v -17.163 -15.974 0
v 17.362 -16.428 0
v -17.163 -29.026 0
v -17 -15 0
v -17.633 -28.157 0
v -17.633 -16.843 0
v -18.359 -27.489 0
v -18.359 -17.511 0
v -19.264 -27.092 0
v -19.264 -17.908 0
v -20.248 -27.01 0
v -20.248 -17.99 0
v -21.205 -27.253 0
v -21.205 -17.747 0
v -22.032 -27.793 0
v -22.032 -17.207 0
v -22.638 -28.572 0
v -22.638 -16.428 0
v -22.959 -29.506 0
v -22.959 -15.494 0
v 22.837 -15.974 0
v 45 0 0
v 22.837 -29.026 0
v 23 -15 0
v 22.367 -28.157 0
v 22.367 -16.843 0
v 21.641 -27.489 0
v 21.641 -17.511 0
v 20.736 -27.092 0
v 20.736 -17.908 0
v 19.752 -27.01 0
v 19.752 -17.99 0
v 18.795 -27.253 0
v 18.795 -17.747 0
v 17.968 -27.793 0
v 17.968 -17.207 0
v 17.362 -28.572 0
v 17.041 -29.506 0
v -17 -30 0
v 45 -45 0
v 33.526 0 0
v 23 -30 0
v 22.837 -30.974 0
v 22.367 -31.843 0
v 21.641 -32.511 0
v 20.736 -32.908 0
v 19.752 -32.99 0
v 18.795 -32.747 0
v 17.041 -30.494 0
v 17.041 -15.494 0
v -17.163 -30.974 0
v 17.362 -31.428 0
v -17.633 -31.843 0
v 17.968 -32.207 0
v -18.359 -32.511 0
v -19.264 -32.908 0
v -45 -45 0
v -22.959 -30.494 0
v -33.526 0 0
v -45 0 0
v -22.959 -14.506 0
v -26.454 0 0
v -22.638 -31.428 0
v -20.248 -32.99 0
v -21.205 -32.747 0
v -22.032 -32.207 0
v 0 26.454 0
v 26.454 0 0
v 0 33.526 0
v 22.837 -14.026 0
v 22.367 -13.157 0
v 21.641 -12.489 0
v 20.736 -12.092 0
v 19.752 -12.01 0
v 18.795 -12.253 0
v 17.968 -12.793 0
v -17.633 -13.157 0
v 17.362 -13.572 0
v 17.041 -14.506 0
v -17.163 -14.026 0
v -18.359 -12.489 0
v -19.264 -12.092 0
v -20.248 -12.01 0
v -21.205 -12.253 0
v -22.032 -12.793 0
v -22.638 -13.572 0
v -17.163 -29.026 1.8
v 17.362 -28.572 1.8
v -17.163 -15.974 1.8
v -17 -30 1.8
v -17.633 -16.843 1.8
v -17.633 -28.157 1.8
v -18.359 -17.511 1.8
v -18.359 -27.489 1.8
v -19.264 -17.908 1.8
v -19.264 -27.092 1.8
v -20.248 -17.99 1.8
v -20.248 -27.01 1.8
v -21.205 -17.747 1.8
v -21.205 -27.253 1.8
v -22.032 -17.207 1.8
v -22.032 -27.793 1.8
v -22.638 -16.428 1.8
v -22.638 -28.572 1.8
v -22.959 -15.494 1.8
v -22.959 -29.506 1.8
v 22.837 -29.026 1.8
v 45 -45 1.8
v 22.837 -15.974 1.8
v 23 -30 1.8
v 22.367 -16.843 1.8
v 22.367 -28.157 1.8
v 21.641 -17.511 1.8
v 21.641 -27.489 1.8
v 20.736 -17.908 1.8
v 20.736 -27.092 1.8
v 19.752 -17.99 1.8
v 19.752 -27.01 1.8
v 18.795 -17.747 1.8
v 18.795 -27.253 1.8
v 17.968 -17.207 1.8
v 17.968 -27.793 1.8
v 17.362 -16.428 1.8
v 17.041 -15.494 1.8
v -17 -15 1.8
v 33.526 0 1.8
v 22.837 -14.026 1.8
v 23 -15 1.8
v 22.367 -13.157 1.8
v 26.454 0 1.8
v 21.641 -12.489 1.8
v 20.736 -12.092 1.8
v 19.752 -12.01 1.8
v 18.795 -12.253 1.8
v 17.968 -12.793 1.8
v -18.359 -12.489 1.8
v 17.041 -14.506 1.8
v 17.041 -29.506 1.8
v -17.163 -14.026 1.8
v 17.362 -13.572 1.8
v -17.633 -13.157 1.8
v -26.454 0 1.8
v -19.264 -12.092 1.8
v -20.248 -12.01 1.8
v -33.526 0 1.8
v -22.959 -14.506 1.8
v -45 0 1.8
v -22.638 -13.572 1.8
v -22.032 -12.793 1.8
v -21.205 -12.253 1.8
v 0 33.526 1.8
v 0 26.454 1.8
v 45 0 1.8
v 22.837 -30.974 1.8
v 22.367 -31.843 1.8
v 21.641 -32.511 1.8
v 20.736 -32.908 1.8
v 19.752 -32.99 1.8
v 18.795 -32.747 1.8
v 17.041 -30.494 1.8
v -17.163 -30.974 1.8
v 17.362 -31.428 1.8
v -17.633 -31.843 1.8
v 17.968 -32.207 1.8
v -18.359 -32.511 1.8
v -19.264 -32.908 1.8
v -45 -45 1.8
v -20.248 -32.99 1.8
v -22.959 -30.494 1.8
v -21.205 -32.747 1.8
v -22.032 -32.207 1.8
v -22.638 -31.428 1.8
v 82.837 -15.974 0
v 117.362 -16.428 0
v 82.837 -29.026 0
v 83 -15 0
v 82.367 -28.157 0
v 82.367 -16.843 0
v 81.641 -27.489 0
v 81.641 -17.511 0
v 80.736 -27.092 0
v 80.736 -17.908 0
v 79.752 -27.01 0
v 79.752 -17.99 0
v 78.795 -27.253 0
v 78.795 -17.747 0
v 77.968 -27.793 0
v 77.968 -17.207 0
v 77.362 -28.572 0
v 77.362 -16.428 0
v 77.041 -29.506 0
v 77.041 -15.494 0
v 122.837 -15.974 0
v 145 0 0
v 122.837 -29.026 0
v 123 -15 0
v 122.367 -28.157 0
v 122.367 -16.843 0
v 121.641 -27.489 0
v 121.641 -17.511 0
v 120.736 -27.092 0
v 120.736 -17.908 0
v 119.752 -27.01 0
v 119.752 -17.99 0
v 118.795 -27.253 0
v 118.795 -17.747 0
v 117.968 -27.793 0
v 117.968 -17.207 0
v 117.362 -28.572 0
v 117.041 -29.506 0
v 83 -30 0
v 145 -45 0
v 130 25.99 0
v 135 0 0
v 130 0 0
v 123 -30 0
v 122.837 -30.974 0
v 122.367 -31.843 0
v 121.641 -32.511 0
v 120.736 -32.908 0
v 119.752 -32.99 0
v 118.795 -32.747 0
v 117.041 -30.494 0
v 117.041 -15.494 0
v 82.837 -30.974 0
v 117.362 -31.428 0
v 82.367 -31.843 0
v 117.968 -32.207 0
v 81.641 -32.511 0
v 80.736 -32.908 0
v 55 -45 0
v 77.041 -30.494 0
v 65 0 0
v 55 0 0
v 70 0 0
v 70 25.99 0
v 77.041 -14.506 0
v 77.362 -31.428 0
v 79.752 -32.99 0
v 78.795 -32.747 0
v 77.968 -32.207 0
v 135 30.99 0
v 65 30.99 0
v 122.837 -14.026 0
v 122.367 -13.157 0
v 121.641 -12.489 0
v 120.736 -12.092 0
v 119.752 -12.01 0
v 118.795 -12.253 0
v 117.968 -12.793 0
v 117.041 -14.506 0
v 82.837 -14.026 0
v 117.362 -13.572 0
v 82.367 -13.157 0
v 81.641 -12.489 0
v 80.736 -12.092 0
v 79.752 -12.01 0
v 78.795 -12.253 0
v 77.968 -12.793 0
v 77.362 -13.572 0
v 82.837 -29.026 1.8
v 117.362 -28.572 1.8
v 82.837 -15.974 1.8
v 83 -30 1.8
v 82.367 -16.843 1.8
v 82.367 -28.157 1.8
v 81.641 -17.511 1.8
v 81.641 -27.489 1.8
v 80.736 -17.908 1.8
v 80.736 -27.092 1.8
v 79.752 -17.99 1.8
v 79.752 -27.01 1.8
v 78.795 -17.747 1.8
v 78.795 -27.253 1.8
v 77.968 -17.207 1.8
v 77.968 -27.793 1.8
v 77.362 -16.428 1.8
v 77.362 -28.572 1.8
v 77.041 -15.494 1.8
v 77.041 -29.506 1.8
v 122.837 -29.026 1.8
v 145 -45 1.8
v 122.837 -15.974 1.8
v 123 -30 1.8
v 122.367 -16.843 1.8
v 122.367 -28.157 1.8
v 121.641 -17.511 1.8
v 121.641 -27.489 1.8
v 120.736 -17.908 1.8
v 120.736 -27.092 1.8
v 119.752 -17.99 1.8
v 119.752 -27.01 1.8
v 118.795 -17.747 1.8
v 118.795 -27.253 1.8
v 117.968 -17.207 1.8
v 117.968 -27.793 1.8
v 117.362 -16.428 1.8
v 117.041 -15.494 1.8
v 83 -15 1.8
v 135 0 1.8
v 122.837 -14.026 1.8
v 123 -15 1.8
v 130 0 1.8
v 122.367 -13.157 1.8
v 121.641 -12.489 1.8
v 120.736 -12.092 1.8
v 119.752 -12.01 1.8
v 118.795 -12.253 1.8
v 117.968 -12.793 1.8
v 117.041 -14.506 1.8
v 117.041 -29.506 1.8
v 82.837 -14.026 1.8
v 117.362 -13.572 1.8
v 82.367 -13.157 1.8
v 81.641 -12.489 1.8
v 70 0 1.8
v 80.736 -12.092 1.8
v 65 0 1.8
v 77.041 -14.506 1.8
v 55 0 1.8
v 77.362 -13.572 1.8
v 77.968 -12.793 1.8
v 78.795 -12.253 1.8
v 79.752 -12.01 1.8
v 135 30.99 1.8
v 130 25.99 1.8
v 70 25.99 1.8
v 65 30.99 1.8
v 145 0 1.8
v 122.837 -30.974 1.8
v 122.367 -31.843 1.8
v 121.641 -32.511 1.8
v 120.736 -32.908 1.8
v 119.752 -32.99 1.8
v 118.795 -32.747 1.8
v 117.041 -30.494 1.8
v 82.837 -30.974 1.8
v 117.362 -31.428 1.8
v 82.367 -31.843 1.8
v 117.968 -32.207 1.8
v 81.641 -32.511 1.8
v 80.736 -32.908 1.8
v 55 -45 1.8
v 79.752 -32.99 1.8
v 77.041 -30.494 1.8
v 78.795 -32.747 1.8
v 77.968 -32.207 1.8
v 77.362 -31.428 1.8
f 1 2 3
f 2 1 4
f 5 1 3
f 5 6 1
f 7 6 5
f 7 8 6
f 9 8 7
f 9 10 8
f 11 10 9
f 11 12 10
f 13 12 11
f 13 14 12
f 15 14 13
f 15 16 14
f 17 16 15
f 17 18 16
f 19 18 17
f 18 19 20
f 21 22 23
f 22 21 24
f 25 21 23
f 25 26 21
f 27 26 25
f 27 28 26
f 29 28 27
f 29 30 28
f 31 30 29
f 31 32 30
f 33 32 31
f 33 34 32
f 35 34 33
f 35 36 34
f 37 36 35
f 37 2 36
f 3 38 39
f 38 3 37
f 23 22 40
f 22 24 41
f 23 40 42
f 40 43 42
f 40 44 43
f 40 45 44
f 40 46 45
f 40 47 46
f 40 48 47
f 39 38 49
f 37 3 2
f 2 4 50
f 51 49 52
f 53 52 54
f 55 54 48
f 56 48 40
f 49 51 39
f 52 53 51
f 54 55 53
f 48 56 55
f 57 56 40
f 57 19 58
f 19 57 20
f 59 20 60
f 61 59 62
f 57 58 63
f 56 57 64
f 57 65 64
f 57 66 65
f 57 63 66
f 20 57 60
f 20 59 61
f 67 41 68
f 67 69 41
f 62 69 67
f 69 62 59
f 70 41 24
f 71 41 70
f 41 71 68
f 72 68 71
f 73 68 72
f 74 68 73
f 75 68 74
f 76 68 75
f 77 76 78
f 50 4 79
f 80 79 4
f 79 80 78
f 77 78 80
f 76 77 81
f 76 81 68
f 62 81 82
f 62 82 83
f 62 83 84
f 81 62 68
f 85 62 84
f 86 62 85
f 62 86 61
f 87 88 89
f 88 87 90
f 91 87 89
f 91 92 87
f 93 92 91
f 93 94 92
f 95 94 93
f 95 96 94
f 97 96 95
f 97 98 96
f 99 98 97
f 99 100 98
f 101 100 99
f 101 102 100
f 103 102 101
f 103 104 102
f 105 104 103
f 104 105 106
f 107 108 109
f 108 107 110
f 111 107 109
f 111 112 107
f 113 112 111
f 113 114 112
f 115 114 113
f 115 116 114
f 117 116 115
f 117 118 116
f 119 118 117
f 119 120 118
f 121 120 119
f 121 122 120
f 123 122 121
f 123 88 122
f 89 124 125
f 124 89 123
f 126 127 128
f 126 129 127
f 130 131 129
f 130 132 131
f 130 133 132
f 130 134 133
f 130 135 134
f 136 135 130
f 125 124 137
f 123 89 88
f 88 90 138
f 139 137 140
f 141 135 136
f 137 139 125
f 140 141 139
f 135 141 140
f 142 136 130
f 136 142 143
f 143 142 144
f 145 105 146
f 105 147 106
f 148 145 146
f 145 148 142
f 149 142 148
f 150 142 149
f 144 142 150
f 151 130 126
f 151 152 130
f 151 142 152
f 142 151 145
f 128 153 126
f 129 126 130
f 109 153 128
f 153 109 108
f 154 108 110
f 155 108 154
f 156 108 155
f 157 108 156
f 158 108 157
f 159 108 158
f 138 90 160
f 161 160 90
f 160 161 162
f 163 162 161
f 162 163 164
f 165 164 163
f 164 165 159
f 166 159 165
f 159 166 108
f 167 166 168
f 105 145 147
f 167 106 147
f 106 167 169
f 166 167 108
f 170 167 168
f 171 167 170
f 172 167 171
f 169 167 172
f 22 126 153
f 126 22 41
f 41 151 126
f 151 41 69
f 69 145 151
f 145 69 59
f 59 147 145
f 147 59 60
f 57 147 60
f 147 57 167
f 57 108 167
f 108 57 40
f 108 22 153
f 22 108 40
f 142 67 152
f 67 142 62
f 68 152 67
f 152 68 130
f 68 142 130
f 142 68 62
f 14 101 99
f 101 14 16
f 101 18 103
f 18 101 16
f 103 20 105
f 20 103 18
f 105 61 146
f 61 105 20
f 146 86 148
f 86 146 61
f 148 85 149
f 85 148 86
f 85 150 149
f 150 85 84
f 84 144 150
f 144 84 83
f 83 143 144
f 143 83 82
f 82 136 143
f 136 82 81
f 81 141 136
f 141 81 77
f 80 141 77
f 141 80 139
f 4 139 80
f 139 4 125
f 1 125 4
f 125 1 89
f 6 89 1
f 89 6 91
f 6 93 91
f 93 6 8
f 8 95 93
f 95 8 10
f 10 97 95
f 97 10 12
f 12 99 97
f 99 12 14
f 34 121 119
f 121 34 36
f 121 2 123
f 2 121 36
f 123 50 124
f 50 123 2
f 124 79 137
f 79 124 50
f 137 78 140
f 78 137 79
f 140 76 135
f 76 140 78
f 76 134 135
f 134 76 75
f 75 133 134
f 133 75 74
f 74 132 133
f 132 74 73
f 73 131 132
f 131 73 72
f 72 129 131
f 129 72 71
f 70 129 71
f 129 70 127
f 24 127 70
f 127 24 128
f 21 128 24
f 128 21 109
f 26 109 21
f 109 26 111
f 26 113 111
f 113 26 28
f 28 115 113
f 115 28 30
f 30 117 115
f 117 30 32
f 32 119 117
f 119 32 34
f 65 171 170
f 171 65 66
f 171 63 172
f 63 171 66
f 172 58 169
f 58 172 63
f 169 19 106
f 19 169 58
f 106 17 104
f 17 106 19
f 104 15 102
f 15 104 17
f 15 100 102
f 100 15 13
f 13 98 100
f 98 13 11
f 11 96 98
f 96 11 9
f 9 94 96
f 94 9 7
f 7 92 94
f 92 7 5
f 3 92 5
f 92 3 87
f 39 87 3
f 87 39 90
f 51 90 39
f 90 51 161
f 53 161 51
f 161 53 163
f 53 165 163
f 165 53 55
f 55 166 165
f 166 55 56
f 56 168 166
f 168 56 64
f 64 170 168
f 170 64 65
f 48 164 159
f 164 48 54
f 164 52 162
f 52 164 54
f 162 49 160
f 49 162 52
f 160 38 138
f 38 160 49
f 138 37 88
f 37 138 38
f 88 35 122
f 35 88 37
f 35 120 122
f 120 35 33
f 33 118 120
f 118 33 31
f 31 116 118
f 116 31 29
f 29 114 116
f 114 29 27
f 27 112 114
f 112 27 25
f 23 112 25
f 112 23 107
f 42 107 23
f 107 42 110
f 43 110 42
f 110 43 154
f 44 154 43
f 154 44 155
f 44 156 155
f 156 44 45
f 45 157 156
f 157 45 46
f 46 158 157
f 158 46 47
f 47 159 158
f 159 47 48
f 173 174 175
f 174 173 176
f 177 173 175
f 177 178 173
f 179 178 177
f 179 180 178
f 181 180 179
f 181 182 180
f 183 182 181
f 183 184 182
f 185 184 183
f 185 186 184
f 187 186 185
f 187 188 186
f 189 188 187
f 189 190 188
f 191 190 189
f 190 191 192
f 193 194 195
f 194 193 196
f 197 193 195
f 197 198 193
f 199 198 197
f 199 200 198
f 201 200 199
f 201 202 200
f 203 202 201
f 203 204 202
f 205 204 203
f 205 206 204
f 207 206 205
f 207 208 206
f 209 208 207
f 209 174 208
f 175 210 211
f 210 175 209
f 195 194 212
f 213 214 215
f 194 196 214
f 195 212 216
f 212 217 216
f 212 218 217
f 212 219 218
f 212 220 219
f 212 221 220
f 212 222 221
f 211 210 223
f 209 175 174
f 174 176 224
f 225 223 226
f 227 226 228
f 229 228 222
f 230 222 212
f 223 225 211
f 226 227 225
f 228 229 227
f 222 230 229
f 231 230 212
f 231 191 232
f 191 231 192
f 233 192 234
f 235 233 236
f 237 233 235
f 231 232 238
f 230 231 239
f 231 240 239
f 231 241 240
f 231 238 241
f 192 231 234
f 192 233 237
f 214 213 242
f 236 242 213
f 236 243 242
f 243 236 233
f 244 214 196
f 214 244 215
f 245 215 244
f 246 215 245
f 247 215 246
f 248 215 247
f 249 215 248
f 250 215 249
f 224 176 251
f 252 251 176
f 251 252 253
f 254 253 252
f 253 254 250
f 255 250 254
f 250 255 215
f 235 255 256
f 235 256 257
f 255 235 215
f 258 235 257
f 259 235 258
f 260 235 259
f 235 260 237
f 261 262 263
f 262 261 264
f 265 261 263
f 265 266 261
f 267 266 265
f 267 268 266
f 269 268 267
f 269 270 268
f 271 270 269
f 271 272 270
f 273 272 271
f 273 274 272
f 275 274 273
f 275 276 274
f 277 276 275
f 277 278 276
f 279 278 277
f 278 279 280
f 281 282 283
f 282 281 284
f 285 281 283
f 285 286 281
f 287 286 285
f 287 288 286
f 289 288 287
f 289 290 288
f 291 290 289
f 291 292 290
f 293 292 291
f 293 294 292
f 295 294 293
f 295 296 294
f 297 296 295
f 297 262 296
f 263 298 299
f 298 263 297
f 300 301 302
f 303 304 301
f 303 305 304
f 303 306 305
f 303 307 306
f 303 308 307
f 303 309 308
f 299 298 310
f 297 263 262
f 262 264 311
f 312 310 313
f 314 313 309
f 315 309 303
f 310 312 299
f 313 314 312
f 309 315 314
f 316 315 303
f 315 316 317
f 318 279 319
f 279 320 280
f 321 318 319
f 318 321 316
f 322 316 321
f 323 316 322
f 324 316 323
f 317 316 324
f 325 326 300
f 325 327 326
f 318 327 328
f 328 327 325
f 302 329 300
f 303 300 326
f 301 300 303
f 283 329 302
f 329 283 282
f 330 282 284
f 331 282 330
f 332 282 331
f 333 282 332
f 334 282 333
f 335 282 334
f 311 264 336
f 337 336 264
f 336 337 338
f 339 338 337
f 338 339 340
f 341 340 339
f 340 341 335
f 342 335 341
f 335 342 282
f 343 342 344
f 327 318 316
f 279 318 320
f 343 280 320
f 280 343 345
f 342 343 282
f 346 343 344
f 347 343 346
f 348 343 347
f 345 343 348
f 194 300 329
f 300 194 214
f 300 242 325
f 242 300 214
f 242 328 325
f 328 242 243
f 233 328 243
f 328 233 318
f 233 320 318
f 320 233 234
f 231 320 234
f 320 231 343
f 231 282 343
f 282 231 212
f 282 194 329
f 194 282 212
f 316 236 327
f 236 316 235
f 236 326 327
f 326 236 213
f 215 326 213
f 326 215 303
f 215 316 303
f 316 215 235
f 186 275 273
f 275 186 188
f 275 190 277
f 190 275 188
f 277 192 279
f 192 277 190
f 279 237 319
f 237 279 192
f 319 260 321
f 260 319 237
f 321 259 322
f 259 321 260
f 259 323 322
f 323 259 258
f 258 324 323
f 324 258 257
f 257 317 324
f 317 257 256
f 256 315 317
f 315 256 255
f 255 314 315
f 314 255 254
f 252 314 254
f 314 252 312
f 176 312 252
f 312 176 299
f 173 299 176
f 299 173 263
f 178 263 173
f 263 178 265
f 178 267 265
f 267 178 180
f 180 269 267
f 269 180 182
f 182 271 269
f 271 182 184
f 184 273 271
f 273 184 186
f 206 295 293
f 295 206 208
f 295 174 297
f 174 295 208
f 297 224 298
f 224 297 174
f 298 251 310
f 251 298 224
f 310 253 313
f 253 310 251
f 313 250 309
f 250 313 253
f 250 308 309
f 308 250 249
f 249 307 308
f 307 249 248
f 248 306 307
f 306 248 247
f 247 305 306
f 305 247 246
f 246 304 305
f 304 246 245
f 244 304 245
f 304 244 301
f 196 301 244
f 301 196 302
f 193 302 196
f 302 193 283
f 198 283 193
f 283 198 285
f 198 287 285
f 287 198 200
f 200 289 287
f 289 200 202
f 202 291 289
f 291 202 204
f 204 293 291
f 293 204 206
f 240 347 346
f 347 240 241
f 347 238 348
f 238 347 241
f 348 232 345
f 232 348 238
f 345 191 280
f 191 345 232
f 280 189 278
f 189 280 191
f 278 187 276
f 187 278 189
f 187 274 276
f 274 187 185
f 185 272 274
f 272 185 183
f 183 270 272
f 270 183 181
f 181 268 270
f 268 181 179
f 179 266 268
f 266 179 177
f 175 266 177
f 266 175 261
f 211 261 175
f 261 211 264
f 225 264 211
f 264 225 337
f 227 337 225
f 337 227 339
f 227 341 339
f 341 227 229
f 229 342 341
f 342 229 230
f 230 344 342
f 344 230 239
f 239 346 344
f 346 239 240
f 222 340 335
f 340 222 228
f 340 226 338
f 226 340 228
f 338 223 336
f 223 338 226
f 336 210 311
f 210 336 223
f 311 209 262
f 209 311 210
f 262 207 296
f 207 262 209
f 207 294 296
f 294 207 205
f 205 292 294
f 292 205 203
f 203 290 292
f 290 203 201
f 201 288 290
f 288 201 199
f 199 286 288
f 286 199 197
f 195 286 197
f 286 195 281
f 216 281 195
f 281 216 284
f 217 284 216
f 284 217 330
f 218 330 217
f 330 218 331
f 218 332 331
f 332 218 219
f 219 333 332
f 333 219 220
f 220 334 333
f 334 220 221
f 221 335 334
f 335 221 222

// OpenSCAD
// -*- mode: SCAD ; c-file-style: "ellemtel" ; coding: utf-8 -*-
//
// NN
//
// © 2018–2019 Roland Sieker <ospalh@gmail.com>
// Licence: CC-BY-SA 4.0

/* [Global] */

// … to preview. You will get all parts as separate STLs when you click “Create Thing”.
part = "s"; // [s: Set, a: Part A, b: Part B]

// Set this to “render” and click on “Create Thing” when done with the setup.
preview = 1; // [0:render, 1:preview]

/* [Sizes] */

// bla bla
size_x = 15;  // [1:0.1:40]

/* [Hidden] */

// Done with the customizer

// *******************************************************
// Extra parameters. These can be changed reasonably safely.


w = 1.8;  // Wall width
p = 1.2;  // Bottom, top plate hight
c = 0.4;  // Clearance
angle = 60; // Overhangs much below 60° are a problem for me

// *******************************************************
// Some shortcuts. These shouldn’t be changed


module kmirror(maxis=[1, 0, 0])
{
   // Keep *and* mirror an object. Standard is left and right mirroring.
   children();
   mirror(maxis)
   {
      children();
   }
}

tau = 2 * PI;  // π is still wrong. τ = circumference / r

xy_factor = 1/tan(angle);
// To get from a hight to a horizontal width inclined correctly
z_factor = tan(angle);  // The other way around


some_distance = 100;
ms = 0.01;  // Muggeseggele.

// fn for differently sized objects and fs, fa; all for preview or rendering.
pna = 40;
pnb = 15;
pa = 5;
ps = 1;
rna = 180;
rnb = 30;
ra = 2;
rs = 0.25;
function na() = (preview) ? pna : rna;
function nb() = (preview) ? pnb : rnb;
$fs = (preview) ? ps : rs;
$fa = (preview) ? pa : ra;

// *******************************************************
// End setup



// *******************************************************
// Generate the parts

print_part();


if ("s" == part)
{
   preview_parts();
}

if ("st" == part)
{
   // Use "st" during development
   stack_parts();
}

module print_part()
{
   if ("a" == part)
   {
      part_a();
   }
   if ("b" == part)
   {
      part_b();
   }
}

module preview_parts()
{
   part_a();
   translate([some_distance, 0, 0])
   {
      part_b();
   }
}

module stack_parts()
{
   // intersection()
   {
      color("yellow")
      {
         part_a();
      }
      translate([0,0,30])
      {
         color("red")
         {
            part_b();
         }
      }
   }
}

// *******************************************************
// Code for the parts themselves


module part_a()
{
   linear_extrude(w)
   {
      plate_ab();
      translate([0,-ms,0])
         hanger_a();
   }
}

module part_b()
{
   linear_extrude(w)
   {
      plate_ab();
      translate([0,-ms,0])
         hanger_b();
   }
}



module plate_ab()
{
   translate([0, -45])
   {
      difference()
      {
         translate([-45,0])
         square([90,45]);
         holepair(15);
         holepair(30);
      }
   }
}

module hanger_a()
{
   translate([0,30])
   kmirror()
   {
      rotate(135)
      {
         translate([-2.5, -2.5])
         square([5,55]);
      }
   }
}


module hanger_b()
{
   translate([-35, 26])
   {
      square([70,5]);
   }
   kmirror()
   {
      translate([-35, 0])
         square([5,29]);
   }
}


module holepair(y)
{
   translate([0,y])
      {
         translate([-20,0])
            circle(r=3);
         translate([20,0])
            circle(r=3);
      }
}
